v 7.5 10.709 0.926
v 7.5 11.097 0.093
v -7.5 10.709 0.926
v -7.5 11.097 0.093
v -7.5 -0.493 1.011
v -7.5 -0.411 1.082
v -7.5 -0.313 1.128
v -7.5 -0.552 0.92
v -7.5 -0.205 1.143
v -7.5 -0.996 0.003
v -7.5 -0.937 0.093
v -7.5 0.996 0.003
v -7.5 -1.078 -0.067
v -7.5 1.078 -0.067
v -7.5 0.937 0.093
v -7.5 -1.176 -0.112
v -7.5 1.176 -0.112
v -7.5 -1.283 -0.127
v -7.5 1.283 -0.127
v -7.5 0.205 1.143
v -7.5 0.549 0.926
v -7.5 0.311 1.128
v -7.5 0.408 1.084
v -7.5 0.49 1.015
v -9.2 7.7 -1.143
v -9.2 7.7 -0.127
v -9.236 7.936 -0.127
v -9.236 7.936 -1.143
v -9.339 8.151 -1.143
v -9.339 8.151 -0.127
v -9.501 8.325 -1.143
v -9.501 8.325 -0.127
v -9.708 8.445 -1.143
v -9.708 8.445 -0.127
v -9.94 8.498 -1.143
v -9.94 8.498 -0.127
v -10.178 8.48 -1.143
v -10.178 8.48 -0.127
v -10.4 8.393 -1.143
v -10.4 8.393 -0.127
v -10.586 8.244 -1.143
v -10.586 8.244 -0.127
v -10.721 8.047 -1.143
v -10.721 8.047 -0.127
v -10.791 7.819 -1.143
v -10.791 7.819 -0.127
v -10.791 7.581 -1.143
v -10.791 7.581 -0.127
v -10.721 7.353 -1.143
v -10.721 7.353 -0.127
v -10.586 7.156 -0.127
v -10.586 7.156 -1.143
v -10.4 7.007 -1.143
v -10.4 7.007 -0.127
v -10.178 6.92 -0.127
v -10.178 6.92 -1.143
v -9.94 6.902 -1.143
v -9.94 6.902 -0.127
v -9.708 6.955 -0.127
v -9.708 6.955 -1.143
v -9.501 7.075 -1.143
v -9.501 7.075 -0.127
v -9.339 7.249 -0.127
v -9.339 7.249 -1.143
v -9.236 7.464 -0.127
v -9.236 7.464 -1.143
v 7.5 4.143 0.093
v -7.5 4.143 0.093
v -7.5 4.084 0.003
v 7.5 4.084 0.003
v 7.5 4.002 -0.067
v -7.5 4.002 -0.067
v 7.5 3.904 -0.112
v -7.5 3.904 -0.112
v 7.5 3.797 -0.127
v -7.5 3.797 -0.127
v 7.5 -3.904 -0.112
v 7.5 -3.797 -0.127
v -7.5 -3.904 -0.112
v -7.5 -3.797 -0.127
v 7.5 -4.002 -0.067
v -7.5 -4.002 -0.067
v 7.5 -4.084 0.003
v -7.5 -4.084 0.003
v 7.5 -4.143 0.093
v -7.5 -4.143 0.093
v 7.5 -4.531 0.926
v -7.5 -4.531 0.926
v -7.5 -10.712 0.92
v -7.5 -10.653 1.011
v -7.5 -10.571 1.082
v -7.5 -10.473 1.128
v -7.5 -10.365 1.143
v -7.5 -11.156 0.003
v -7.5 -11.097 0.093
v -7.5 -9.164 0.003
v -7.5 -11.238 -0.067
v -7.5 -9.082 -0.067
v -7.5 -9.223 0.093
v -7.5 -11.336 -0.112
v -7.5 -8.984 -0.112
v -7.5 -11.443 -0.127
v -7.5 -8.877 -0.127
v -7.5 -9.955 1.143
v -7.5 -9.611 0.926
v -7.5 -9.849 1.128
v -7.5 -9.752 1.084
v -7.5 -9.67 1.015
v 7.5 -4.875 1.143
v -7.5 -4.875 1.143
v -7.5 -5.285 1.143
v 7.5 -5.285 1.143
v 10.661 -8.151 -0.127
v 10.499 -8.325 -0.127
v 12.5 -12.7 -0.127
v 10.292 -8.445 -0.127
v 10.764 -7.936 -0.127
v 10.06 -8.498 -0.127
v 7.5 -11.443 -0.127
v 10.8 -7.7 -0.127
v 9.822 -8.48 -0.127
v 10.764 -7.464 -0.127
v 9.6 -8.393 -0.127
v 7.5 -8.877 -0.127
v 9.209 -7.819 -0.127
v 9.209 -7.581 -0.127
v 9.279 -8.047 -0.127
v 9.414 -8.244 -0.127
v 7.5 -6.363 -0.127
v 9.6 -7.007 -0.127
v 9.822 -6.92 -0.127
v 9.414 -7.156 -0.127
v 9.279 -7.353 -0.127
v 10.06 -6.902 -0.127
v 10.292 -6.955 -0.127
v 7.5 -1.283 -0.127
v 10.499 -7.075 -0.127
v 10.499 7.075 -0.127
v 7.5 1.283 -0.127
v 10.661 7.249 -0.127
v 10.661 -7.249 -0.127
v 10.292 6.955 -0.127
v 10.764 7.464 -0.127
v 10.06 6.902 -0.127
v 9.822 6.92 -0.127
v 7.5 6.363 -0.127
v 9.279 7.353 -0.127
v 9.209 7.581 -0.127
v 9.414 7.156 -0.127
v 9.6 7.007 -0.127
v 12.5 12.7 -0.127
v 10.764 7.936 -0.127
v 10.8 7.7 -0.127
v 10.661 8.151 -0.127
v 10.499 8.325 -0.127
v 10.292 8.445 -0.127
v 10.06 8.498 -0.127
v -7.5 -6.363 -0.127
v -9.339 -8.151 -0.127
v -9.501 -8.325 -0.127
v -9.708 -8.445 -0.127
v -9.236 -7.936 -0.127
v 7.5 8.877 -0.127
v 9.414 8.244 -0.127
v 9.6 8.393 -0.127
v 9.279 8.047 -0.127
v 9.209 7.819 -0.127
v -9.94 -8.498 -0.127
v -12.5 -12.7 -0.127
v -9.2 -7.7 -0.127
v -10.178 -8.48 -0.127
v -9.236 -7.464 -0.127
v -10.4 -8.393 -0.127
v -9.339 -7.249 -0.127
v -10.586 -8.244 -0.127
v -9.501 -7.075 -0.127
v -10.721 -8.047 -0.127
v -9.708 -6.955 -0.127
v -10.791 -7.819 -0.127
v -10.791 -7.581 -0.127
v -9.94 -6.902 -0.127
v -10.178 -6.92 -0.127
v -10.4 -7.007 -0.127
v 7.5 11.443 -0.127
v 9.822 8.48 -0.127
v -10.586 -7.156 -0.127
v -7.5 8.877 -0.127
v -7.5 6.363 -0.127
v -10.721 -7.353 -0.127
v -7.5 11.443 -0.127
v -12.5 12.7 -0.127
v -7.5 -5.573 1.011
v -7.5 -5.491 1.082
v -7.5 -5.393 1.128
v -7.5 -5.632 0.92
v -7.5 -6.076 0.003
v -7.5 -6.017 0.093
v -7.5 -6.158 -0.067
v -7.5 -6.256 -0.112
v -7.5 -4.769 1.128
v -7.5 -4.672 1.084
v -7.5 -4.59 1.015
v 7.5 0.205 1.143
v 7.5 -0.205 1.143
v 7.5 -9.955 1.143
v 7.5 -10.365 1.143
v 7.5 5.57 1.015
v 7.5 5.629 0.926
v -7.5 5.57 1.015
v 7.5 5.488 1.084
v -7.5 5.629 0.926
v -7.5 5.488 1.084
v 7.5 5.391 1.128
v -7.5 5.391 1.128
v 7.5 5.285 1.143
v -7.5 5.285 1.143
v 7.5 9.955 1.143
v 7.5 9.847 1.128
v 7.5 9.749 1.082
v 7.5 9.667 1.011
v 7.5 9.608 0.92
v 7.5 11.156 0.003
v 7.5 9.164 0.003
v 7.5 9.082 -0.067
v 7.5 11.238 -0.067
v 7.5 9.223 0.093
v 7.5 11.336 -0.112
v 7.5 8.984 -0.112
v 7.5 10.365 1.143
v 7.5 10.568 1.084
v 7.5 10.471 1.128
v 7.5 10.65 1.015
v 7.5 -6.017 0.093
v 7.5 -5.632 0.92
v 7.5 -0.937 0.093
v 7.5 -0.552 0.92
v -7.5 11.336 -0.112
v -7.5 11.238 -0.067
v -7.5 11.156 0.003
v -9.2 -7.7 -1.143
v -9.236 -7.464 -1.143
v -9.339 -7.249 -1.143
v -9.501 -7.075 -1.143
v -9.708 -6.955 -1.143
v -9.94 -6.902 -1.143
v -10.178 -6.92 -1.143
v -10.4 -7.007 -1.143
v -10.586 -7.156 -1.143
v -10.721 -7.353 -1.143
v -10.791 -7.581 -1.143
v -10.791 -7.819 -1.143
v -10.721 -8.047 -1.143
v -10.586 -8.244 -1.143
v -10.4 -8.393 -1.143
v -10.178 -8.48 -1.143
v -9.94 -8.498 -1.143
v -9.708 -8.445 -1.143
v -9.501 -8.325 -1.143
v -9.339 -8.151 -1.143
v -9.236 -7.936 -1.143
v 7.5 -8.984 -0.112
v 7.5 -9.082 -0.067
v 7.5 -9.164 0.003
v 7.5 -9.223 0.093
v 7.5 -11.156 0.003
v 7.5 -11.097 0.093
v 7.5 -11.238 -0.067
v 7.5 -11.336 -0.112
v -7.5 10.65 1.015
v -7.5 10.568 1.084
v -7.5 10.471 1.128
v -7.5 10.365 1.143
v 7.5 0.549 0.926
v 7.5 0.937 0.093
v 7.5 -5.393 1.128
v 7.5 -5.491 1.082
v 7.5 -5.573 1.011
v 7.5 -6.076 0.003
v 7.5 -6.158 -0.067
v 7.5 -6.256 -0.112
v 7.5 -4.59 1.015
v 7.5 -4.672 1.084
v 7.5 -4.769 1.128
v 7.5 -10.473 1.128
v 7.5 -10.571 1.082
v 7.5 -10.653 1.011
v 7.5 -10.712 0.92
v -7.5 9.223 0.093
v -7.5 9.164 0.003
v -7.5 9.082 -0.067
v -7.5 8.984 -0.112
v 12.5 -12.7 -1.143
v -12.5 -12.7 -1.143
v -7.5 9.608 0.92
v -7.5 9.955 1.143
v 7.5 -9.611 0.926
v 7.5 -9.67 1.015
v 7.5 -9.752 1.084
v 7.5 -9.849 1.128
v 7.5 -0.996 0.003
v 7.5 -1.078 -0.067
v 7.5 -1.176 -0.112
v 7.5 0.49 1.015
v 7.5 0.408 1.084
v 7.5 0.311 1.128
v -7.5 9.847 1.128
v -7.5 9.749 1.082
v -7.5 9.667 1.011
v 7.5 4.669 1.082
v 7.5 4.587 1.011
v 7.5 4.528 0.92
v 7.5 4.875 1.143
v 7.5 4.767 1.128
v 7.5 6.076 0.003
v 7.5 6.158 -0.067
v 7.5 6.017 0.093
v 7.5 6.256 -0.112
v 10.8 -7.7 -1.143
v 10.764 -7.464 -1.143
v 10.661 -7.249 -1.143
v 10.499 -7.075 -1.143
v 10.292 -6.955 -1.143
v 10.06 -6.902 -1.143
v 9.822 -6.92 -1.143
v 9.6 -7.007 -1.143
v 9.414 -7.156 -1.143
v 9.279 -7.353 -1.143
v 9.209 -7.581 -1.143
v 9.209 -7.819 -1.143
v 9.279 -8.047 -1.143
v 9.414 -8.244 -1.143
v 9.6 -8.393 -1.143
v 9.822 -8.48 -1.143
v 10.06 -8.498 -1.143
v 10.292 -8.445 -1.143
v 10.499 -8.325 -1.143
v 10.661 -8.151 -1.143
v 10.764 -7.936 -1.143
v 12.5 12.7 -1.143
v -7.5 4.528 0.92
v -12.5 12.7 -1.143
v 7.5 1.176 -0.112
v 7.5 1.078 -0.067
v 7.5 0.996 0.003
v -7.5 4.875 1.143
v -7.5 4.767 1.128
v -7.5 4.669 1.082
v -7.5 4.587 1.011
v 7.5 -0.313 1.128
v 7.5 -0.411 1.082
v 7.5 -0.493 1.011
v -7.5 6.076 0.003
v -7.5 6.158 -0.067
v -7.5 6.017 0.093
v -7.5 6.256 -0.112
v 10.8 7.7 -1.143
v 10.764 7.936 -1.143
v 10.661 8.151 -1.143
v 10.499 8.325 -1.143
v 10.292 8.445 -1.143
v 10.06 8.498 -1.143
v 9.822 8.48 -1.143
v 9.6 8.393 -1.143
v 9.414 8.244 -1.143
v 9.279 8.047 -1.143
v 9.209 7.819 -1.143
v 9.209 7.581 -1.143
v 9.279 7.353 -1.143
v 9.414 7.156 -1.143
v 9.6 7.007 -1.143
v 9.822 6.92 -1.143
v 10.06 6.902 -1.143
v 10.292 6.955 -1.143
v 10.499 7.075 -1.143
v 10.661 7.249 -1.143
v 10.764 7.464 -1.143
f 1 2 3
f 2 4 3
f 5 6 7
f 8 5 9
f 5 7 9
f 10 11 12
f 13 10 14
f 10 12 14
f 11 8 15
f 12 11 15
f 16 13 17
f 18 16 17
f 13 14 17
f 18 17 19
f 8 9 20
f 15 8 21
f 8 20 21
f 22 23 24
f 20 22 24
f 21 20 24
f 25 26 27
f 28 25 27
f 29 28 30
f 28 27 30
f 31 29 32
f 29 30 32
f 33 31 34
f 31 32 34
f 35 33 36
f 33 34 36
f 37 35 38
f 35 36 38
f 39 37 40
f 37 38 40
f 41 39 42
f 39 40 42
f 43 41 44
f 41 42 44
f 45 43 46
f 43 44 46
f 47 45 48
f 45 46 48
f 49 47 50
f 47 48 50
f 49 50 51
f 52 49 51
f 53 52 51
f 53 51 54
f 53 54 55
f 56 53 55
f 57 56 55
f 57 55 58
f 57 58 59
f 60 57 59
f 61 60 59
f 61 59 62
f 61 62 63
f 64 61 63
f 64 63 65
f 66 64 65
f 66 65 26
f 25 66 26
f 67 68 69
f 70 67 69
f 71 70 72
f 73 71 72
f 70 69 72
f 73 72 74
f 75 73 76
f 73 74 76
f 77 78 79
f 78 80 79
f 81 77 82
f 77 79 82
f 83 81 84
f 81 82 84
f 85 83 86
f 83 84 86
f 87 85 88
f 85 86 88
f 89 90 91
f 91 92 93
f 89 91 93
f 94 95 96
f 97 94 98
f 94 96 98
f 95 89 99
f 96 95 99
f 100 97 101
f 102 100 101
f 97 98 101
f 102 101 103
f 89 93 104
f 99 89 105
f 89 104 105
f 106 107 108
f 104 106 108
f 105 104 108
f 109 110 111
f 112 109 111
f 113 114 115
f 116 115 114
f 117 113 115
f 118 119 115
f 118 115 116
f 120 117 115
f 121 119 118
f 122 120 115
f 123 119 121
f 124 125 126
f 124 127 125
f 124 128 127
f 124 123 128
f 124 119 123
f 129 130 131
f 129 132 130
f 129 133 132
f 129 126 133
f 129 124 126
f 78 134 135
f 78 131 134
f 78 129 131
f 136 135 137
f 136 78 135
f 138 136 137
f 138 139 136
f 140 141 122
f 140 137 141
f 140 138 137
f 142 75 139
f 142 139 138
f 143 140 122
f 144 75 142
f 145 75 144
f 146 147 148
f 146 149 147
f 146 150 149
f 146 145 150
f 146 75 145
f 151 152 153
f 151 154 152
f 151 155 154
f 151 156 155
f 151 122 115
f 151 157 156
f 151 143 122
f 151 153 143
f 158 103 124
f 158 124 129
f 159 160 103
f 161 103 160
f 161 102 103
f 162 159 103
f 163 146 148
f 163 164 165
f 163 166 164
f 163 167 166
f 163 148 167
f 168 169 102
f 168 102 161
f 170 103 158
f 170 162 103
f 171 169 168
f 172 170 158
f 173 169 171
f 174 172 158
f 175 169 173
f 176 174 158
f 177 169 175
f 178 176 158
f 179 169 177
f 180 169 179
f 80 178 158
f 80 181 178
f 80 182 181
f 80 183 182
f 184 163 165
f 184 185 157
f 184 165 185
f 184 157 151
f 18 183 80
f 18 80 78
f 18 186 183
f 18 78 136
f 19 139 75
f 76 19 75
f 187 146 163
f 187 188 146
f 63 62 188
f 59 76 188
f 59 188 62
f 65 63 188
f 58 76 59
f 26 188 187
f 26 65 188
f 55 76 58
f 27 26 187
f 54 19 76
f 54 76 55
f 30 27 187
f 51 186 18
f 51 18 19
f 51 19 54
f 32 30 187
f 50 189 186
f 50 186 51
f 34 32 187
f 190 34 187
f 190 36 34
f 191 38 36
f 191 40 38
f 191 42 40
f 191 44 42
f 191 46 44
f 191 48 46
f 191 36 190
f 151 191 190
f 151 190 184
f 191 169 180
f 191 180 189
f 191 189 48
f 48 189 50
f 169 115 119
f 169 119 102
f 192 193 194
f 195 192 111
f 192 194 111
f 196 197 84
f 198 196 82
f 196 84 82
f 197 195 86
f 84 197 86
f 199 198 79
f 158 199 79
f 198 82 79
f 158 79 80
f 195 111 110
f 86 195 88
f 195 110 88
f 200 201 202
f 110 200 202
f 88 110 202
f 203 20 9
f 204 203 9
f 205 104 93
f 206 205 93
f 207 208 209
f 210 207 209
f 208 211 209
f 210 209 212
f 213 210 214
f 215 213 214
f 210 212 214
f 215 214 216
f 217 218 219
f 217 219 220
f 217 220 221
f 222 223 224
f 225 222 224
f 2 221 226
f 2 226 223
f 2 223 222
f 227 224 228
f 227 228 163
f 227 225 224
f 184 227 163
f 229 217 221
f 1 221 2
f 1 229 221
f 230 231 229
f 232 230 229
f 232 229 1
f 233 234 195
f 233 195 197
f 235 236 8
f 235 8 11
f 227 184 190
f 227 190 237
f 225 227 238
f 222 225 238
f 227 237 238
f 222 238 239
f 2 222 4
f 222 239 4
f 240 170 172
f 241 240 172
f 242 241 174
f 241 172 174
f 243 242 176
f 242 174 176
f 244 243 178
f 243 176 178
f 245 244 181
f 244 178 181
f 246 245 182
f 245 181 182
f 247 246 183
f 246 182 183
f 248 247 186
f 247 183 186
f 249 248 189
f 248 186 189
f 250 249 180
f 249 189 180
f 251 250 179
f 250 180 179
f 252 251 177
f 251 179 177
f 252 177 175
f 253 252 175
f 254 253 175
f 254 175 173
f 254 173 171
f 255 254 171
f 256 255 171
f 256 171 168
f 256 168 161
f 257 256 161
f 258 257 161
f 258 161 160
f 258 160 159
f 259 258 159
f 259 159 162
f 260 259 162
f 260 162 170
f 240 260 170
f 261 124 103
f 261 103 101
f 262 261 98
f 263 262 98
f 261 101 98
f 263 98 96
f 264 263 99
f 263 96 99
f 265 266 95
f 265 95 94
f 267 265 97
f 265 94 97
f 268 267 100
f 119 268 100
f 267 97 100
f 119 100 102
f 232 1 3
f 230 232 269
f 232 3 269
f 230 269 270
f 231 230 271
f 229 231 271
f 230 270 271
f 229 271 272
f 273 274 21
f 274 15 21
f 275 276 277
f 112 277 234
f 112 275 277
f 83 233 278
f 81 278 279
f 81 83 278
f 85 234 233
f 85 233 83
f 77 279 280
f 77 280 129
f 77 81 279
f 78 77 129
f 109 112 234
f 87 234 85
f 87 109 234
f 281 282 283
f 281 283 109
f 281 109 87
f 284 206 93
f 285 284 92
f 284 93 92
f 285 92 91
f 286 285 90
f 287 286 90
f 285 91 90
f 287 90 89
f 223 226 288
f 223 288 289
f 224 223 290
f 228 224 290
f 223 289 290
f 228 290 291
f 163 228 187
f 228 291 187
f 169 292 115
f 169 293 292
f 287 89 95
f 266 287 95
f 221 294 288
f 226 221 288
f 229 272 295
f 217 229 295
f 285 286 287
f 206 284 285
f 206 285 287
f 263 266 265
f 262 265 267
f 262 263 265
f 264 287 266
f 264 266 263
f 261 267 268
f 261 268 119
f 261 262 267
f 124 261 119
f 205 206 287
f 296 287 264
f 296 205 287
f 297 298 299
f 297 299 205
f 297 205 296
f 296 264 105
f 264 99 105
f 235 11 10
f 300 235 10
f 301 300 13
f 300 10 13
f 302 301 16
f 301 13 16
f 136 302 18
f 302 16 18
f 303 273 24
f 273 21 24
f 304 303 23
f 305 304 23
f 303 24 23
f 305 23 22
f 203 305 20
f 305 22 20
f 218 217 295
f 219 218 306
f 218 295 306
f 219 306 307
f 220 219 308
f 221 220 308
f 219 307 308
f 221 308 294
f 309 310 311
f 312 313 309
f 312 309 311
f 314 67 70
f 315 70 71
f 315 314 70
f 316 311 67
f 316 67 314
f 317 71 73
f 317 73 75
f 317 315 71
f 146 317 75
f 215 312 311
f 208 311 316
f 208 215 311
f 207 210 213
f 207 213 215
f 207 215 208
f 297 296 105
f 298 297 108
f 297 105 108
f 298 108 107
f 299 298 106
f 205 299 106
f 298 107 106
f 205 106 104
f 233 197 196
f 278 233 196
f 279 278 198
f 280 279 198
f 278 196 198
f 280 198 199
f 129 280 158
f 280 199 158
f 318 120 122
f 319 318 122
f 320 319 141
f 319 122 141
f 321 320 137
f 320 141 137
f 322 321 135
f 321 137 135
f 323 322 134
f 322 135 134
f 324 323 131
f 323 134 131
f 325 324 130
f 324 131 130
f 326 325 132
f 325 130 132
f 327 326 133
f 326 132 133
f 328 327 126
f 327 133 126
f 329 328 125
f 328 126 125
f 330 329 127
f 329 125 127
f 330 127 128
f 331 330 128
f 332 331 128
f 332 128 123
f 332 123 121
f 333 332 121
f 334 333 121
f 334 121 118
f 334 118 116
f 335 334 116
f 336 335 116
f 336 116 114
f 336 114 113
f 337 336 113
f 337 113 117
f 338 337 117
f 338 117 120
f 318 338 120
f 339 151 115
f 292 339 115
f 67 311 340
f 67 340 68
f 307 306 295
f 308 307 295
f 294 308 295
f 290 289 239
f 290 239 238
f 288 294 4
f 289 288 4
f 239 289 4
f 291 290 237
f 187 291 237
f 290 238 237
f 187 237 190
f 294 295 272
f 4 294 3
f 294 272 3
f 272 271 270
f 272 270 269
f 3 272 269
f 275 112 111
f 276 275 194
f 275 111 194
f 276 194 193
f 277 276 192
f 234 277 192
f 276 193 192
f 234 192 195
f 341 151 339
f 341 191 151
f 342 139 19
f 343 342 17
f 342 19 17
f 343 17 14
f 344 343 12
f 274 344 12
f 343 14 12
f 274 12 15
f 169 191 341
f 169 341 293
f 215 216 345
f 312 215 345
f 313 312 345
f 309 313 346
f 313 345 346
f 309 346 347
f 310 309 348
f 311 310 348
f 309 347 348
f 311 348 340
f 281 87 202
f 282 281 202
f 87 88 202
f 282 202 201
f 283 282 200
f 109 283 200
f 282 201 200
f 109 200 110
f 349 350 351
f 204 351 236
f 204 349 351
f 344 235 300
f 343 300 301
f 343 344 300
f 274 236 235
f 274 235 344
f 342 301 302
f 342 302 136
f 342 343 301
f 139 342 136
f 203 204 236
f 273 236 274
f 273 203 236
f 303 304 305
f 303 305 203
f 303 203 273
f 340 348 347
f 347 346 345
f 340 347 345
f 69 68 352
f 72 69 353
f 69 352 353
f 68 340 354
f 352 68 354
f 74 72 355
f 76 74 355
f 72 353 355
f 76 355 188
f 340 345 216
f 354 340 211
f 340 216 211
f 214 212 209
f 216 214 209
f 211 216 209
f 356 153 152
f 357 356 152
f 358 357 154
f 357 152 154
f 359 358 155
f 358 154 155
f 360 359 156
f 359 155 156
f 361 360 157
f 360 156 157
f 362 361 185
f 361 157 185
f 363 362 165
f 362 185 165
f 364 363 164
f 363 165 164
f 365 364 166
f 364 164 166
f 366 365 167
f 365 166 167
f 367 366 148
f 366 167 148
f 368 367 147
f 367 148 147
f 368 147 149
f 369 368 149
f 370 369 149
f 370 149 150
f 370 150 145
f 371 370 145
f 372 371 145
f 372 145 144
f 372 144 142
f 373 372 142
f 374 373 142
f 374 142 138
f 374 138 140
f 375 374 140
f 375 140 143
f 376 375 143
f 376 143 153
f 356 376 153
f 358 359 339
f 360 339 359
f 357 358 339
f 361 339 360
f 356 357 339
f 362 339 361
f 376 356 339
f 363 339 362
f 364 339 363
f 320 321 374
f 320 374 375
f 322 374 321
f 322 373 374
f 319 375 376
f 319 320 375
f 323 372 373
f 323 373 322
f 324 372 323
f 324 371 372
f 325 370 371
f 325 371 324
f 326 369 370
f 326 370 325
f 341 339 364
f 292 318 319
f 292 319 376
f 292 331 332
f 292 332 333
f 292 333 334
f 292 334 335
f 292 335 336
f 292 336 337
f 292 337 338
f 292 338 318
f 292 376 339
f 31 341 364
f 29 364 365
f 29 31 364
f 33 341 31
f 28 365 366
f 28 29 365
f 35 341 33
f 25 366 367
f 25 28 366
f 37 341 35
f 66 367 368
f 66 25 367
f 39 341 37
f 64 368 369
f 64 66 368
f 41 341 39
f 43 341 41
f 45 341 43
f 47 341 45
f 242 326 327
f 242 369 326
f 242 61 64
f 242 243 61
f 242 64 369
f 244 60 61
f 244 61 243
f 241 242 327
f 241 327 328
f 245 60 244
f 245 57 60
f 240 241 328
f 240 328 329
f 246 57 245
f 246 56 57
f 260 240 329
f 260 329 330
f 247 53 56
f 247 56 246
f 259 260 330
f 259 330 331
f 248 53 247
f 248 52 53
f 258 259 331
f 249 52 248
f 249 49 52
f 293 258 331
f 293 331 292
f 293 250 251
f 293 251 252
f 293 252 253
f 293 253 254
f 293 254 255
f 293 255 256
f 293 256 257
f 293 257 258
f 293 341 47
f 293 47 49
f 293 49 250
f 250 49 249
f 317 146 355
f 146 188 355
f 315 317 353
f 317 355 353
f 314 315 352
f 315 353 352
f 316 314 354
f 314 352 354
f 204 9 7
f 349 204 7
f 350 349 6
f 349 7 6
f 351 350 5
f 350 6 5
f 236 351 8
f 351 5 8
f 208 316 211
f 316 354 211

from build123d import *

# Parameters (mm, degrees)
F1_DEPTH = 7.5
F3_DEPTH = 5
F5_R     = 0.8
F6_DEPTH = 45


# Not quite as in the source:
# - ends of sketch curves that miss each other by under 0.0002 mm in the source are joined
# - a feature names something its author has since deleted; it is built from what else it names


with BuildPart() as f1:
    # F0 (on Right) → F1 (new body)
    with BuildSketch(Plane.YZ):
        with BuildLine():
            ThreePointArc((9.2226032736, 0.0929824566), (9.0820111575, -0.0673321366), (8.8773, -0.127))
            Line((8.8773, -0.127), (6.3627, -0.127))
            ThreePointArc((6.3627, -0.127), (6.1579888425, -0.0673321366), (6.0173967264, 0.0929824566))
            Line((6.0173967264, 0.0929824566), (5.6288146574, 0.9262855682))
            ThreePointArc((5.6288146574, 0.9262855682), (5.4882390894, 1.0842993961), (5.2850542, 1.143))
            Line((5.2850542, 1.143), (4.8749458, 1.143))
            ThreePointArc((4.8749458, 1.143), (4.668712979, 1.0823576494), (4.5281307776, 0.9197350317))
            Line((4.5281307776, 0.9197350317), (4.1426086033, 0.0929799713))
            ThreePointArc((4.1426086033, 0.0929799713), (4.0020111575, -0.0673321366), (3.7973, -0.127))
            Line((3.7973, -0.127), (1.2827, -0.127))
            ThreePointArc((1.2827, -0.127), (1.0779888425, -0.0673321366), (0.9373967264, 0.0929824566))
            Line((0.9373967264, 0.0929824566), (0.5488146574, 0.9262855682))
            ThreePointArc((0.5488146574, 0.9262855682), (0.4082390894, 1.0842993961), (0.2050542, 1.143))
            Line((0.2050542, 1.143), (-0.2050542, 1.143))
            ThreePointArc((-0.2050542, 1.143), (-0.411287021, 1.0823576494), (-0.5518692224, 0.9197350317))
            Line((-0.5518692224, 0.9197350317), (-0.9373913967, 0.0929799713))
            ThreePointArc((-0.9373913967, 0.0929799713), (-1.0779888425, -0.0673321366), (-1.2827, -0.127))
            Line((-1.2827, -0.127), (-3.7973, -0.127))
            ThreePointArc((-3.7973, -0.127), (-4.0020111575, -0.0673321366), (-4.1426032736, 0.0929824566))
            Line((-4.1426032736, 0.0929824566), (-4.5311853426, 0.9262855682))
            ThreePointArc((-4.5311853426, 0.9262855682), (-4.6717609106, 1.0842993961), (-4.8749458, 1.143))
            Line((-4.8749458, 1.143), (-5.2850542, 1.143))
            ThreePointArc((-5.2850542, 1.143), (-5.491287021, 1.0823576494), (-5.6318692224, 0.9197350317))
            Line((-5.6318692224, 0.9197350317), (-6.0173913967, 0.0929799713))
            ThreePointArc((-6.0173913967, 0.0929799713), (-6.1579888425, -0.0673321366), (-6.3627, -0.127))
            Line((-6.3627, -0.127), (-8.8773, -0.127))
            ThreePointArc((-8.8773, -0.127), (-9.0820111575, -0.0673321366), (-9.2226032736, 0.0929824566))
            Line((-9.2226032736, 0.0929824566), (-9.6111853426, 0.9262855682))
            ThreePointArc((-9.6111853426, 0.9262855682), (-9.7517609106, 1.0842993961), (-9.9549458, 1.143))
            Line((-9.9549458, 1.143), (-10.3650542, 1.143))
            ThreePointArc((-10.3650542, 1.143), (-10.571287021, 1.0823576494), (-10.7118692224, 0.9197350317))
            Line((-10.7118692224, 0.9197350317), (-11.0973913967, 0.0929799713))
            ThreePointArc((-11.0973913967, 0.0929799713), (-11.2379888425, -0.0673321366), (-11.4427, -0.127))
            Line((-11.4427, -0.127), (-12.7, -0.127))
            Line((-12.7, -0.127), (-12.7, -1.143))
            Line((-12.7, -1.143), (12.7, -1.143))
            Line((12.7, -1.143), (12.7, -0.127))
            Line((12.7, -0.127), (11.4427, -0.127))
            ThreePointArc((11.4427, -0.127), (11.2379888425, -0.0673321366), (11.0973967264, 0.0929824566))
            Line((11.0973967264, 0.0929824566), (10.7088146574, 0.9262855682))
            ThreePointArc((10.7088146574, 0.9262855682), (10.5682390894, 1.0842993961), (10.3650542, 1.143))
            Line((10.3650542, 1.143), (9.9549458, 1.143))
            ThreePointArc((9.9549458, 1.143), (9.748712979, 1.0823576494), (9.6081307776, 0.9197350317))
            Line((9.6081307776, 0.9197350317), (9.2226032736, 0.0929824566))
        make_face()
    extrude(amount=-F1_DEPTH)

    # F2 (on face) → F3 (join)
    with BuildSketch(Plane(origin=(-7.5, 0, 0), x_dir=(0, -1, 0), z_dir=(-1, 0, 0))):
        Polygon((-11.4427, -0.127), (-12.7, -0.127), (-12.7, -1.143), (12.7, -1.143), (12.7, -0.127), (11.4427, -0.127), (8.8773, -0.127), (6.3627, -0.127), (3.7973, -0.127), (1.2827, -0.127), (-1.2827, -0.127), (-3.7973, -0.127), (-6.3627, -0.127), (-8.8773, -0.127), align=None)
    extrude(amount=F3_DEPTH)

    # F4: F1 across plane


with BuildPart() as f1_1:
    add(f1.part)
    add(f1.part.mirror(Plane.YZ))

    # F5 (on face) → F6 (cut)
    with BuildSketch(Plane.XY.offset(-0.127)):
        with Locations((10, 7.7)):
            Circle(F5_R)
        with Locations((10, -7.7)):
            Circle(F5_R)
        with Locations((-10, 7.7)):
            Circle(F5_R)
        with Locations((-10, -7.7)):
            Circle(F5_R)
    extrude(amount=-F6_DEPTH, mode=Mode.SUBTRACT)


solid = f1_1.part
